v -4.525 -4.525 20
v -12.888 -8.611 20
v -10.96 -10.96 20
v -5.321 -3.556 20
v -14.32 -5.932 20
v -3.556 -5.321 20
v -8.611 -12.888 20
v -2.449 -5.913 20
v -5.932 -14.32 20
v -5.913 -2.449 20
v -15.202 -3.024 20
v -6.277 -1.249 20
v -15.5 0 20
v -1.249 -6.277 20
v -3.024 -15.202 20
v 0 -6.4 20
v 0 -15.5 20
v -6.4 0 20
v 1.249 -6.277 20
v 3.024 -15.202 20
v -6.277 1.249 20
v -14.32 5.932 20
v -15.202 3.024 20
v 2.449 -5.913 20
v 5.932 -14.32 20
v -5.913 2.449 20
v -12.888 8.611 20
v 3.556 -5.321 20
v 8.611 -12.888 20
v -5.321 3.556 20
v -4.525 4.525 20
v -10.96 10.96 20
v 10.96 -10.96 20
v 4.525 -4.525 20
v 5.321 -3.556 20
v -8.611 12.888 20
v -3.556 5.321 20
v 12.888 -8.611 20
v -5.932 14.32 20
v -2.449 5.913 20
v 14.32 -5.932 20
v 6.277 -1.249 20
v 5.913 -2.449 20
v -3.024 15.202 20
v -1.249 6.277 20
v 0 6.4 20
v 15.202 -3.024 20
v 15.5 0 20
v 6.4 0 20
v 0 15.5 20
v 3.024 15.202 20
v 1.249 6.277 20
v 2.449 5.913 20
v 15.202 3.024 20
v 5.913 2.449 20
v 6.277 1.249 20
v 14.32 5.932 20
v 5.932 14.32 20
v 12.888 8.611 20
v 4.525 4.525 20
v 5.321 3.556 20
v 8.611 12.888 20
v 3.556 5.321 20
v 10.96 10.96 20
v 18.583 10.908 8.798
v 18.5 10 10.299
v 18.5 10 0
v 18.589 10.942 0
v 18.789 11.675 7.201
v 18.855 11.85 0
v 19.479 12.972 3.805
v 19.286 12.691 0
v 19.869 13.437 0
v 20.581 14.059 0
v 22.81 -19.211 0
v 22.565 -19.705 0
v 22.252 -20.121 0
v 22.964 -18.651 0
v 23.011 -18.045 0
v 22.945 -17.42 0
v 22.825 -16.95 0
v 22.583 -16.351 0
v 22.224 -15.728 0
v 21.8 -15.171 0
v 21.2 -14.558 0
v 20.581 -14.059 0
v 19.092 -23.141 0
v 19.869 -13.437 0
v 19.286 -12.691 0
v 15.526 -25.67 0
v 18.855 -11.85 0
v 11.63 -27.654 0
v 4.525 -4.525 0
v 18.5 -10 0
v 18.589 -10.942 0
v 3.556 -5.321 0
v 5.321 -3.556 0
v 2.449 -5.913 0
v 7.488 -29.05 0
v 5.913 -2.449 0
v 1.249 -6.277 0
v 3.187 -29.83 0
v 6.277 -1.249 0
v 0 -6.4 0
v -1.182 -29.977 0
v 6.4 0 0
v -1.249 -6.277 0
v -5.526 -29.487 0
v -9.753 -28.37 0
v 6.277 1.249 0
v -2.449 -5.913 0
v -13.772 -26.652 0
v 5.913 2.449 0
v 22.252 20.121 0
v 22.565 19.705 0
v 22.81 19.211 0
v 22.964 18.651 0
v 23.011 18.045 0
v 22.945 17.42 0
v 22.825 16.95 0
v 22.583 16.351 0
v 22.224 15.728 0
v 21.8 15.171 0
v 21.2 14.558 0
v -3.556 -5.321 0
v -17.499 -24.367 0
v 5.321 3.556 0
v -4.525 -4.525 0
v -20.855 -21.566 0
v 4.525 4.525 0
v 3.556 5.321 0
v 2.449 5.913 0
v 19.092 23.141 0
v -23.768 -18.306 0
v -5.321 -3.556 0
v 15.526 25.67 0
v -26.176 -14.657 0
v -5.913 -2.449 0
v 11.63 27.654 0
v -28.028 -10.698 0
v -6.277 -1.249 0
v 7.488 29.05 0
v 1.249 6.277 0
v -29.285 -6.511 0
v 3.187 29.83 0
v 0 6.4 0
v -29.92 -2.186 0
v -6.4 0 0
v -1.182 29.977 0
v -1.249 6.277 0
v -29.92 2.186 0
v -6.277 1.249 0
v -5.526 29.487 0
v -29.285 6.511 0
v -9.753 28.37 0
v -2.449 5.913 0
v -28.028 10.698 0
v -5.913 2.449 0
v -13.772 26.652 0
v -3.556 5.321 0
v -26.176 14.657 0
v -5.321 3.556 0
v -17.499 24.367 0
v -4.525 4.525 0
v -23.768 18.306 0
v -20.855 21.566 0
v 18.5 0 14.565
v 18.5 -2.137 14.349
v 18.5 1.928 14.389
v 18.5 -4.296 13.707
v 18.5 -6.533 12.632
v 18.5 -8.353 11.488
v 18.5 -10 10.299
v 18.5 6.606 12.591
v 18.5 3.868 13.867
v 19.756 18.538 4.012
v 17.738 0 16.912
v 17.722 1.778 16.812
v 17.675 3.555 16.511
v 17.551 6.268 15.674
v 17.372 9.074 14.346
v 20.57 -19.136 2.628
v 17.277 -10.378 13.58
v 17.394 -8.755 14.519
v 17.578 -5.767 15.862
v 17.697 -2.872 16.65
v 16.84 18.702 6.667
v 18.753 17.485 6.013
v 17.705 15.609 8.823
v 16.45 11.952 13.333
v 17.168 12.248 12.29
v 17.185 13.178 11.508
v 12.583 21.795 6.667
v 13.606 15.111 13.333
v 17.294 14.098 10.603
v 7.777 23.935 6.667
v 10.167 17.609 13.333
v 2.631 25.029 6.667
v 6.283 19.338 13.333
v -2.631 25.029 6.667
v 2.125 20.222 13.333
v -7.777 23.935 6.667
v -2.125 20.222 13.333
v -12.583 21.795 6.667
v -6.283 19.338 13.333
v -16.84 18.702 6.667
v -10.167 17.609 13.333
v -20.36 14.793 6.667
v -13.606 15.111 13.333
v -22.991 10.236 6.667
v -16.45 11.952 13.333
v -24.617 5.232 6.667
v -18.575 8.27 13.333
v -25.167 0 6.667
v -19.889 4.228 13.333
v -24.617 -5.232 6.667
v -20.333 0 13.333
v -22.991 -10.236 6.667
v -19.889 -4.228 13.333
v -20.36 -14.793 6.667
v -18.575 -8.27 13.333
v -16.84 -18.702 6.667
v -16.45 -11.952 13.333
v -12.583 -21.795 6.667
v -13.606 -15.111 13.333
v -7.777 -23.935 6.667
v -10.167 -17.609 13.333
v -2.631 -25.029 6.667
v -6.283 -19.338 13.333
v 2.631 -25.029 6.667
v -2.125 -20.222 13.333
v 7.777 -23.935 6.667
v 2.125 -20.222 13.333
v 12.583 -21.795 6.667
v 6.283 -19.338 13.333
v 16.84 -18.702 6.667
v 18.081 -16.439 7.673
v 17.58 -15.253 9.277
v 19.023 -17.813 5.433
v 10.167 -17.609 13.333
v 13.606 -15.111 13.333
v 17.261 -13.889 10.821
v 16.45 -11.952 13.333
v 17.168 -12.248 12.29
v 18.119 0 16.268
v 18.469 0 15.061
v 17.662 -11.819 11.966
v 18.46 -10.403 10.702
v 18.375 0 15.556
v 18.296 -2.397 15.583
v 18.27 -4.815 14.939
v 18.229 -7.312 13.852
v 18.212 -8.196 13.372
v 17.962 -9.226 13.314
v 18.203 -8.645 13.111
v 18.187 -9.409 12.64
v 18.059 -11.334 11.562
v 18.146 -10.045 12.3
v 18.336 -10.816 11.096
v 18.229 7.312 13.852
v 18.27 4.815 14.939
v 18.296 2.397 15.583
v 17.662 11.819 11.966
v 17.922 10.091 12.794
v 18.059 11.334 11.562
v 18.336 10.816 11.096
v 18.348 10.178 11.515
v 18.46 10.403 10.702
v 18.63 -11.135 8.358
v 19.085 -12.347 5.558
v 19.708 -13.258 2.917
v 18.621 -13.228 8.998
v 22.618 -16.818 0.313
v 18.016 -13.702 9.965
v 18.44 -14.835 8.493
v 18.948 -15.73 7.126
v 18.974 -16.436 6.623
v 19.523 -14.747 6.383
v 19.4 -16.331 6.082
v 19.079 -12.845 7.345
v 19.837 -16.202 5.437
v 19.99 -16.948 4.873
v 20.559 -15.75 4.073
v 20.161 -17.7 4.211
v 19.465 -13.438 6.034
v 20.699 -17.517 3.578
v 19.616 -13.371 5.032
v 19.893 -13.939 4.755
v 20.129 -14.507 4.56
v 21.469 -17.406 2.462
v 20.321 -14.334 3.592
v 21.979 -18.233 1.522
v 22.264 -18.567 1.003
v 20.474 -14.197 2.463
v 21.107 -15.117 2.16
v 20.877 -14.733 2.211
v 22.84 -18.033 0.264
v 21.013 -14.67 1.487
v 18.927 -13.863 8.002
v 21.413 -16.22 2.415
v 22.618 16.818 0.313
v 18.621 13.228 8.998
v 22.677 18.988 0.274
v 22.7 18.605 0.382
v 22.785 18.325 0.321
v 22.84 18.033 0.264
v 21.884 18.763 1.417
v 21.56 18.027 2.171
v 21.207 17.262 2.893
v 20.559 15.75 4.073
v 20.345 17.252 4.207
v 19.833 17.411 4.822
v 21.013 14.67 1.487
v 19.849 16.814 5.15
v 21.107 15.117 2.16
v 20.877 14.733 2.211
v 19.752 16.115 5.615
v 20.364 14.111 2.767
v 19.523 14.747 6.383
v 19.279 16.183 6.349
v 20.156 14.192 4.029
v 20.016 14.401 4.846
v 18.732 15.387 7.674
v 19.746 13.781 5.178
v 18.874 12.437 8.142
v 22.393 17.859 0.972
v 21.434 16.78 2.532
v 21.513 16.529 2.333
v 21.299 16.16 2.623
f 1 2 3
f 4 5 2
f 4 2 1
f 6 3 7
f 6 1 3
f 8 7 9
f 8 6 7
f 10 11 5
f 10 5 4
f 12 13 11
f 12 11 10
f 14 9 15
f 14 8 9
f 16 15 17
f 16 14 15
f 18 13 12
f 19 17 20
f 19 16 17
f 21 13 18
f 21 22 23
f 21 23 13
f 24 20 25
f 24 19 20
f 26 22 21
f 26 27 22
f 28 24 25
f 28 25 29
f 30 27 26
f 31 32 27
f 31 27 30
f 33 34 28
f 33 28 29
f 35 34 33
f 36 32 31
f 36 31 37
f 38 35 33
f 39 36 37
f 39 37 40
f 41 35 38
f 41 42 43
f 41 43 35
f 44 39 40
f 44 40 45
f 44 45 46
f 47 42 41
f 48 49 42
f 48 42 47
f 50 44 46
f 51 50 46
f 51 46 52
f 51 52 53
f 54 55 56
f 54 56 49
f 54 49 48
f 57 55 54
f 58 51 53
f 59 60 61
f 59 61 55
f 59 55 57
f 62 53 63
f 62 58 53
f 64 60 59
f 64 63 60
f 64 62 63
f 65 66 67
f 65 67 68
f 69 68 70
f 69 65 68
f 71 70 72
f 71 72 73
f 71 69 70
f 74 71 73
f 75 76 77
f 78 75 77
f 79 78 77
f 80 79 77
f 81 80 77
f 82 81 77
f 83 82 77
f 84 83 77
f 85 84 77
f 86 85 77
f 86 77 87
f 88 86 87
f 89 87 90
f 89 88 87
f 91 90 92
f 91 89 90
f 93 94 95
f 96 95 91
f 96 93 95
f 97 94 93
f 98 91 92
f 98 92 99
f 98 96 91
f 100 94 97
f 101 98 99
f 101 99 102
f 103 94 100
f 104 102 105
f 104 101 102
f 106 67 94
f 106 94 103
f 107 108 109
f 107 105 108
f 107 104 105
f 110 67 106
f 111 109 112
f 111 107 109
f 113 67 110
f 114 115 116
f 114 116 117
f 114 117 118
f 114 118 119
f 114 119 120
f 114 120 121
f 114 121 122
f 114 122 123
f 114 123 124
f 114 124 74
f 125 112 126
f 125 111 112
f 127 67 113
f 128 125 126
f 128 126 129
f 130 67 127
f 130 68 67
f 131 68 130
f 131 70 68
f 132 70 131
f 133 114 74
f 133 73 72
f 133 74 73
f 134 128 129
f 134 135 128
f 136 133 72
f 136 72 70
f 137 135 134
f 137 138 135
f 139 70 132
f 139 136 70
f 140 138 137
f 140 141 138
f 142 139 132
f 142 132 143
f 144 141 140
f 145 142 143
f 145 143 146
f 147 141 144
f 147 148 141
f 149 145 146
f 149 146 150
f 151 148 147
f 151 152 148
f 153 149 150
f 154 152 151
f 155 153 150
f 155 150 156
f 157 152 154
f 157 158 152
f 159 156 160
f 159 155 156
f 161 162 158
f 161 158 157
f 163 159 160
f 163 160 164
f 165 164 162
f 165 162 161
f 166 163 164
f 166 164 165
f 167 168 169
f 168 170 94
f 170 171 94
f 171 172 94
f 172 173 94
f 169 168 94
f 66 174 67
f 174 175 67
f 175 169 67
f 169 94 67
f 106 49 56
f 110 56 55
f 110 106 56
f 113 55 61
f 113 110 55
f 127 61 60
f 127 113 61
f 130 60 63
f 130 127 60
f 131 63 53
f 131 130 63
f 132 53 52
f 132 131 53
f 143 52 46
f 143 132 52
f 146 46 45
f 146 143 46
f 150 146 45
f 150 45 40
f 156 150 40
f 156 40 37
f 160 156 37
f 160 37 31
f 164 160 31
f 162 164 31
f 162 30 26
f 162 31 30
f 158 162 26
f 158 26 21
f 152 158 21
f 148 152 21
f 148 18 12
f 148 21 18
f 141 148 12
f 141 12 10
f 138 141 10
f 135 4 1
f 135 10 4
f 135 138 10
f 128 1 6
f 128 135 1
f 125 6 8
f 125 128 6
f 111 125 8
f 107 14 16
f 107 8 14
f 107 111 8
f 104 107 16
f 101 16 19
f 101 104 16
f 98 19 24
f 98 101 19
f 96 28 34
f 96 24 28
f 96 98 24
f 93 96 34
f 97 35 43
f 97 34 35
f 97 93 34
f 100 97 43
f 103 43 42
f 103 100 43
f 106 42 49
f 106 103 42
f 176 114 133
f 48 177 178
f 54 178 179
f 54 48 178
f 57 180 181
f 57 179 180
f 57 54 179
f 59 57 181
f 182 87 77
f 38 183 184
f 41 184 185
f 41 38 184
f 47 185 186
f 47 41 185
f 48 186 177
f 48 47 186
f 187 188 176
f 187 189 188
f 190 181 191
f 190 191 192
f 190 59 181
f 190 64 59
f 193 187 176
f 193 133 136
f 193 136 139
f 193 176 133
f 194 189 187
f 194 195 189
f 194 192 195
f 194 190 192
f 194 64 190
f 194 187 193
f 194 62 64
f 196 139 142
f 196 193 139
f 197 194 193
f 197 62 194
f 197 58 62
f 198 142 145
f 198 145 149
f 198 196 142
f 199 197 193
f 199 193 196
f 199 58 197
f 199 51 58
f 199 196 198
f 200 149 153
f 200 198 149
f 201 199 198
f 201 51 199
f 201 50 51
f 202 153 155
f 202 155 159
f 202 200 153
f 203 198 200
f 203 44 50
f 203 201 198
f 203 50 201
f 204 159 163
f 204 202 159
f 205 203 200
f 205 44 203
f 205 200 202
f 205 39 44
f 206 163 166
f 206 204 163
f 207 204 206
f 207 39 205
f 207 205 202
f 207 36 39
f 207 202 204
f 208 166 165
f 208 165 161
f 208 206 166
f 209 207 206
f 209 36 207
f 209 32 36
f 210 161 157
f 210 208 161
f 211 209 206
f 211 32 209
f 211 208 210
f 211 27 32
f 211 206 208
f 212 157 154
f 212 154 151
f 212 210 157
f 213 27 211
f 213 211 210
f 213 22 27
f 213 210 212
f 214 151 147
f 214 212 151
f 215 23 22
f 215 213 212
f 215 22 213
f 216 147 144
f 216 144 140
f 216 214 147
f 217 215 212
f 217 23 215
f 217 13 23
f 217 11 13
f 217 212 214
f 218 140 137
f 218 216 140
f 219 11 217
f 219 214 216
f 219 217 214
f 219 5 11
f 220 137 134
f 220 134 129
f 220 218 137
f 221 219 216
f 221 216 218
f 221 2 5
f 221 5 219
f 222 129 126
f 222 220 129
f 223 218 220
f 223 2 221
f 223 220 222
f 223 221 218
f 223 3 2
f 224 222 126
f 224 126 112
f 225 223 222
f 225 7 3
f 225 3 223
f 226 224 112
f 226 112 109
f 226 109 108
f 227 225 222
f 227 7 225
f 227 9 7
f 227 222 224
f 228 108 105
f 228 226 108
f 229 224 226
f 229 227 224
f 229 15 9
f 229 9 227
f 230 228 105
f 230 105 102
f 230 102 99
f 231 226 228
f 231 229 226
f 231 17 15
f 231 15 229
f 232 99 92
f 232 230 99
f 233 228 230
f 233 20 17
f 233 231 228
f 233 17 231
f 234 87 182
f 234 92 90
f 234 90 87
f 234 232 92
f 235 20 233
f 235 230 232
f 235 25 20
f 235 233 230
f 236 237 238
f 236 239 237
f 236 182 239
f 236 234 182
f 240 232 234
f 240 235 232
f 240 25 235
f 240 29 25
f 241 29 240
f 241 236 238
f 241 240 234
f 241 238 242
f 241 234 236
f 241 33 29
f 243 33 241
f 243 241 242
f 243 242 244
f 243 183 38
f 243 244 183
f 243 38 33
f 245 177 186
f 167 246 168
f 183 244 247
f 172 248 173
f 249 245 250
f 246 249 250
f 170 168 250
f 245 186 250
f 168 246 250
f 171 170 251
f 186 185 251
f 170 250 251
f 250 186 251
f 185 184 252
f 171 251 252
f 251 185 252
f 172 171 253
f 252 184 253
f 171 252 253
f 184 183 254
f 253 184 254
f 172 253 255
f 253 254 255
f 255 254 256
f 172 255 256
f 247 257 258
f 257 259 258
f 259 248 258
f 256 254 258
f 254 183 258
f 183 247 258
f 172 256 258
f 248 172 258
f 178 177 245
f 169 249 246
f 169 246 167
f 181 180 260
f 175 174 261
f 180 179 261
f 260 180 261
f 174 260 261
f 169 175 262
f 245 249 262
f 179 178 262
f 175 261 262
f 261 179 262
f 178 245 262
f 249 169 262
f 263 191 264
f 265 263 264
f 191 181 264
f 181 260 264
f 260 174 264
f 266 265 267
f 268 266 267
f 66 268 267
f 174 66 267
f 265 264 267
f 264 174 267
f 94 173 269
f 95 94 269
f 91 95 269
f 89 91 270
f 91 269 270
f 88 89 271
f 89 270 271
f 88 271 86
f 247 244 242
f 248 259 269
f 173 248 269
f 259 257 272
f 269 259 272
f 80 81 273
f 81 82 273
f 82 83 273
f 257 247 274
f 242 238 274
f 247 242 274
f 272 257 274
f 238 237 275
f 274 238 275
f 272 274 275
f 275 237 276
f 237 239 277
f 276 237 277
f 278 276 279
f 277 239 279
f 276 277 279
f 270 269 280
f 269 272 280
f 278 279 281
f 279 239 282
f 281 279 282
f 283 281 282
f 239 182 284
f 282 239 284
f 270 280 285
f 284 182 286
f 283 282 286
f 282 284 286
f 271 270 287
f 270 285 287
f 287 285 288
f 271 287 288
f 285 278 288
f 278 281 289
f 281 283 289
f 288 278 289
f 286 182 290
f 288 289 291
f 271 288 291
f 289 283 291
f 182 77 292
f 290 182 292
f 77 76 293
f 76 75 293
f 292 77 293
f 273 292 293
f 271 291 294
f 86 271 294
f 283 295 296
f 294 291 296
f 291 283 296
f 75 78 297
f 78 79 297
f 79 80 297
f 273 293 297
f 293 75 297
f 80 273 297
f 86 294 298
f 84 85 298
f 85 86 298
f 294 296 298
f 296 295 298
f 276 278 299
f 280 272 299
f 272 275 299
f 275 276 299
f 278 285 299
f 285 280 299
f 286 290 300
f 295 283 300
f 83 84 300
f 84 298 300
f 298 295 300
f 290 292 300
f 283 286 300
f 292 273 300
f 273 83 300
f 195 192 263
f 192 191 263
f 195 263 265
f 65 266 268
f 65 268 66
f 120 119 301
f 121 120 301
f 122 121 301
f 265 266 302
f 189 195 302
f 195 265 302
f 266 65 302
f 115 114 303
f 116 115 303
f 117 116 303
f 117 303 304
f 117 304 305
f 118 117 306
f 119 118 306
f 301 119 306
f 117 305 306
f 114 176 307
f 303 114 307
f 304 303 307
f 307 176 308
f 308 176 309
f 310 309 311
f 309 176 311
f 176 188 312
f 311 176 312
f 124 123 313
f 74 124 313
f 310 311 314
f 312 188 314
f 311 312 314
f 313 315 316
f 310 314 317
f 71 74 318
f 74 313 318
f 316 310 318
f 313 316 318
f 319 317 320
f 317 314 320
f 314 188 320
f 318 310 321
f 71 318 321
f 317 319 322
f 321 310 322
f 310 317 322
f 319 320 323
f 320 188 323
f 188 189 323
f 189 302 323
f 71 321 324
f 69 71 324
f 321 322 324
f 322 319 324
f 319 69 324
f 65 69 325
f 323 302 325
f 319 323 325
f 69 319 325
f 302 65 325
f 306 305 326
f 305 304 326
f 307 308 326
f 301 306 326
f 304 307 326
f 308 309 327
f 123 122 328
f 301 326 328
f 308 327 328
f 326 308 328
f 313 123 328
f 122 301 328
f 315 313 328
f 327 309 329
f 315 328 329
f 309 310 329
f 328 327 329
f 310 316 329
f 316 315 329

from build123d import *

# Parameters (mm, degrees)
BOX_W          = 20
BOX_H          = 30
BOX_DEPTH      = 40
FILLET_R       = 5
CYLINDER_R     = 6.4
CYLINDER_DEPTH = 40
BOX001_W       = 40
BOX001_H       = 40
BOX001_DEPTH   = 40
FILLET001_R    = 4


with BuildPart() as weirdsidething:
    # Box → Box (new body)
    with BuildSketch(Plane(origin=(18.5, -15, 0), x_dir=(1, 0, 0), z_dir=(0, 0, 1))):
        with Locations((10, 15)):
            Rectangle(BOX_W, BOX_H)
    extrude(amount=BOX_DEPTH)

    # Fillet
    fillet_edges = [weirdsidething.edges().sort_by_distance(p)[0] for p in [
        (18.5, -15, 20),
        (18.5, 15, 20),
    ]]
    fillet(fillet_edges, radius=FILLET_R)


with BuildPart() as cylinder:
    # Cylinder → Cylinder (new body)
    with BuildSketch(Plane.XY):
        Circle(CYLINDER_R)
    extrude(amount=CYLINDER_DEPTH)


with BuildPart() as fusion001:
    # Box001 → Box001 (new body)
    with BuildSketch(Plane(origin=(-20, -20, 20), x_dir=(1, 0, 0), z_dir=(0, 0, 1))):
        with Locations((20, 20)):
            Rectangle(BOX001_W, BOX001_H)
    extrude(amount=BOX001_DEPTH)

    # Fusion: union Cylinder
    add(cylinder.part)

    # Fusion001: union weirdSideThing
    add(weirdsidething.part)


with BuildPart() as fillet001:
    # Cone → Cone (revolve)
    with BuildSketch(Plane.XZ):
        Polygon((0, 0), (30, 0), (1, 40), (0, 40), align=None)
    revolve(axis=Axis((0, 0, 0), (0, 0, 1)))

    # Cut: cut Fusion001
    add(fusion001.part, mode=Mode.SUBTRACT)

    # Fillet001
    fillet001_edges = [fillet001.edges().sort_by_distance(p)[0] for p in [
        (18.5, -5.247536, 14.855397),
        (20.110238, -13.675529, 7.835067),
        (20.110238, 13.675529, 7.835067),
        (18.5, 5.247536, 14.855397),
    ]]
    fillet(fillet001_edges, radius=FILLET001_R)


solid = fillet001.part
